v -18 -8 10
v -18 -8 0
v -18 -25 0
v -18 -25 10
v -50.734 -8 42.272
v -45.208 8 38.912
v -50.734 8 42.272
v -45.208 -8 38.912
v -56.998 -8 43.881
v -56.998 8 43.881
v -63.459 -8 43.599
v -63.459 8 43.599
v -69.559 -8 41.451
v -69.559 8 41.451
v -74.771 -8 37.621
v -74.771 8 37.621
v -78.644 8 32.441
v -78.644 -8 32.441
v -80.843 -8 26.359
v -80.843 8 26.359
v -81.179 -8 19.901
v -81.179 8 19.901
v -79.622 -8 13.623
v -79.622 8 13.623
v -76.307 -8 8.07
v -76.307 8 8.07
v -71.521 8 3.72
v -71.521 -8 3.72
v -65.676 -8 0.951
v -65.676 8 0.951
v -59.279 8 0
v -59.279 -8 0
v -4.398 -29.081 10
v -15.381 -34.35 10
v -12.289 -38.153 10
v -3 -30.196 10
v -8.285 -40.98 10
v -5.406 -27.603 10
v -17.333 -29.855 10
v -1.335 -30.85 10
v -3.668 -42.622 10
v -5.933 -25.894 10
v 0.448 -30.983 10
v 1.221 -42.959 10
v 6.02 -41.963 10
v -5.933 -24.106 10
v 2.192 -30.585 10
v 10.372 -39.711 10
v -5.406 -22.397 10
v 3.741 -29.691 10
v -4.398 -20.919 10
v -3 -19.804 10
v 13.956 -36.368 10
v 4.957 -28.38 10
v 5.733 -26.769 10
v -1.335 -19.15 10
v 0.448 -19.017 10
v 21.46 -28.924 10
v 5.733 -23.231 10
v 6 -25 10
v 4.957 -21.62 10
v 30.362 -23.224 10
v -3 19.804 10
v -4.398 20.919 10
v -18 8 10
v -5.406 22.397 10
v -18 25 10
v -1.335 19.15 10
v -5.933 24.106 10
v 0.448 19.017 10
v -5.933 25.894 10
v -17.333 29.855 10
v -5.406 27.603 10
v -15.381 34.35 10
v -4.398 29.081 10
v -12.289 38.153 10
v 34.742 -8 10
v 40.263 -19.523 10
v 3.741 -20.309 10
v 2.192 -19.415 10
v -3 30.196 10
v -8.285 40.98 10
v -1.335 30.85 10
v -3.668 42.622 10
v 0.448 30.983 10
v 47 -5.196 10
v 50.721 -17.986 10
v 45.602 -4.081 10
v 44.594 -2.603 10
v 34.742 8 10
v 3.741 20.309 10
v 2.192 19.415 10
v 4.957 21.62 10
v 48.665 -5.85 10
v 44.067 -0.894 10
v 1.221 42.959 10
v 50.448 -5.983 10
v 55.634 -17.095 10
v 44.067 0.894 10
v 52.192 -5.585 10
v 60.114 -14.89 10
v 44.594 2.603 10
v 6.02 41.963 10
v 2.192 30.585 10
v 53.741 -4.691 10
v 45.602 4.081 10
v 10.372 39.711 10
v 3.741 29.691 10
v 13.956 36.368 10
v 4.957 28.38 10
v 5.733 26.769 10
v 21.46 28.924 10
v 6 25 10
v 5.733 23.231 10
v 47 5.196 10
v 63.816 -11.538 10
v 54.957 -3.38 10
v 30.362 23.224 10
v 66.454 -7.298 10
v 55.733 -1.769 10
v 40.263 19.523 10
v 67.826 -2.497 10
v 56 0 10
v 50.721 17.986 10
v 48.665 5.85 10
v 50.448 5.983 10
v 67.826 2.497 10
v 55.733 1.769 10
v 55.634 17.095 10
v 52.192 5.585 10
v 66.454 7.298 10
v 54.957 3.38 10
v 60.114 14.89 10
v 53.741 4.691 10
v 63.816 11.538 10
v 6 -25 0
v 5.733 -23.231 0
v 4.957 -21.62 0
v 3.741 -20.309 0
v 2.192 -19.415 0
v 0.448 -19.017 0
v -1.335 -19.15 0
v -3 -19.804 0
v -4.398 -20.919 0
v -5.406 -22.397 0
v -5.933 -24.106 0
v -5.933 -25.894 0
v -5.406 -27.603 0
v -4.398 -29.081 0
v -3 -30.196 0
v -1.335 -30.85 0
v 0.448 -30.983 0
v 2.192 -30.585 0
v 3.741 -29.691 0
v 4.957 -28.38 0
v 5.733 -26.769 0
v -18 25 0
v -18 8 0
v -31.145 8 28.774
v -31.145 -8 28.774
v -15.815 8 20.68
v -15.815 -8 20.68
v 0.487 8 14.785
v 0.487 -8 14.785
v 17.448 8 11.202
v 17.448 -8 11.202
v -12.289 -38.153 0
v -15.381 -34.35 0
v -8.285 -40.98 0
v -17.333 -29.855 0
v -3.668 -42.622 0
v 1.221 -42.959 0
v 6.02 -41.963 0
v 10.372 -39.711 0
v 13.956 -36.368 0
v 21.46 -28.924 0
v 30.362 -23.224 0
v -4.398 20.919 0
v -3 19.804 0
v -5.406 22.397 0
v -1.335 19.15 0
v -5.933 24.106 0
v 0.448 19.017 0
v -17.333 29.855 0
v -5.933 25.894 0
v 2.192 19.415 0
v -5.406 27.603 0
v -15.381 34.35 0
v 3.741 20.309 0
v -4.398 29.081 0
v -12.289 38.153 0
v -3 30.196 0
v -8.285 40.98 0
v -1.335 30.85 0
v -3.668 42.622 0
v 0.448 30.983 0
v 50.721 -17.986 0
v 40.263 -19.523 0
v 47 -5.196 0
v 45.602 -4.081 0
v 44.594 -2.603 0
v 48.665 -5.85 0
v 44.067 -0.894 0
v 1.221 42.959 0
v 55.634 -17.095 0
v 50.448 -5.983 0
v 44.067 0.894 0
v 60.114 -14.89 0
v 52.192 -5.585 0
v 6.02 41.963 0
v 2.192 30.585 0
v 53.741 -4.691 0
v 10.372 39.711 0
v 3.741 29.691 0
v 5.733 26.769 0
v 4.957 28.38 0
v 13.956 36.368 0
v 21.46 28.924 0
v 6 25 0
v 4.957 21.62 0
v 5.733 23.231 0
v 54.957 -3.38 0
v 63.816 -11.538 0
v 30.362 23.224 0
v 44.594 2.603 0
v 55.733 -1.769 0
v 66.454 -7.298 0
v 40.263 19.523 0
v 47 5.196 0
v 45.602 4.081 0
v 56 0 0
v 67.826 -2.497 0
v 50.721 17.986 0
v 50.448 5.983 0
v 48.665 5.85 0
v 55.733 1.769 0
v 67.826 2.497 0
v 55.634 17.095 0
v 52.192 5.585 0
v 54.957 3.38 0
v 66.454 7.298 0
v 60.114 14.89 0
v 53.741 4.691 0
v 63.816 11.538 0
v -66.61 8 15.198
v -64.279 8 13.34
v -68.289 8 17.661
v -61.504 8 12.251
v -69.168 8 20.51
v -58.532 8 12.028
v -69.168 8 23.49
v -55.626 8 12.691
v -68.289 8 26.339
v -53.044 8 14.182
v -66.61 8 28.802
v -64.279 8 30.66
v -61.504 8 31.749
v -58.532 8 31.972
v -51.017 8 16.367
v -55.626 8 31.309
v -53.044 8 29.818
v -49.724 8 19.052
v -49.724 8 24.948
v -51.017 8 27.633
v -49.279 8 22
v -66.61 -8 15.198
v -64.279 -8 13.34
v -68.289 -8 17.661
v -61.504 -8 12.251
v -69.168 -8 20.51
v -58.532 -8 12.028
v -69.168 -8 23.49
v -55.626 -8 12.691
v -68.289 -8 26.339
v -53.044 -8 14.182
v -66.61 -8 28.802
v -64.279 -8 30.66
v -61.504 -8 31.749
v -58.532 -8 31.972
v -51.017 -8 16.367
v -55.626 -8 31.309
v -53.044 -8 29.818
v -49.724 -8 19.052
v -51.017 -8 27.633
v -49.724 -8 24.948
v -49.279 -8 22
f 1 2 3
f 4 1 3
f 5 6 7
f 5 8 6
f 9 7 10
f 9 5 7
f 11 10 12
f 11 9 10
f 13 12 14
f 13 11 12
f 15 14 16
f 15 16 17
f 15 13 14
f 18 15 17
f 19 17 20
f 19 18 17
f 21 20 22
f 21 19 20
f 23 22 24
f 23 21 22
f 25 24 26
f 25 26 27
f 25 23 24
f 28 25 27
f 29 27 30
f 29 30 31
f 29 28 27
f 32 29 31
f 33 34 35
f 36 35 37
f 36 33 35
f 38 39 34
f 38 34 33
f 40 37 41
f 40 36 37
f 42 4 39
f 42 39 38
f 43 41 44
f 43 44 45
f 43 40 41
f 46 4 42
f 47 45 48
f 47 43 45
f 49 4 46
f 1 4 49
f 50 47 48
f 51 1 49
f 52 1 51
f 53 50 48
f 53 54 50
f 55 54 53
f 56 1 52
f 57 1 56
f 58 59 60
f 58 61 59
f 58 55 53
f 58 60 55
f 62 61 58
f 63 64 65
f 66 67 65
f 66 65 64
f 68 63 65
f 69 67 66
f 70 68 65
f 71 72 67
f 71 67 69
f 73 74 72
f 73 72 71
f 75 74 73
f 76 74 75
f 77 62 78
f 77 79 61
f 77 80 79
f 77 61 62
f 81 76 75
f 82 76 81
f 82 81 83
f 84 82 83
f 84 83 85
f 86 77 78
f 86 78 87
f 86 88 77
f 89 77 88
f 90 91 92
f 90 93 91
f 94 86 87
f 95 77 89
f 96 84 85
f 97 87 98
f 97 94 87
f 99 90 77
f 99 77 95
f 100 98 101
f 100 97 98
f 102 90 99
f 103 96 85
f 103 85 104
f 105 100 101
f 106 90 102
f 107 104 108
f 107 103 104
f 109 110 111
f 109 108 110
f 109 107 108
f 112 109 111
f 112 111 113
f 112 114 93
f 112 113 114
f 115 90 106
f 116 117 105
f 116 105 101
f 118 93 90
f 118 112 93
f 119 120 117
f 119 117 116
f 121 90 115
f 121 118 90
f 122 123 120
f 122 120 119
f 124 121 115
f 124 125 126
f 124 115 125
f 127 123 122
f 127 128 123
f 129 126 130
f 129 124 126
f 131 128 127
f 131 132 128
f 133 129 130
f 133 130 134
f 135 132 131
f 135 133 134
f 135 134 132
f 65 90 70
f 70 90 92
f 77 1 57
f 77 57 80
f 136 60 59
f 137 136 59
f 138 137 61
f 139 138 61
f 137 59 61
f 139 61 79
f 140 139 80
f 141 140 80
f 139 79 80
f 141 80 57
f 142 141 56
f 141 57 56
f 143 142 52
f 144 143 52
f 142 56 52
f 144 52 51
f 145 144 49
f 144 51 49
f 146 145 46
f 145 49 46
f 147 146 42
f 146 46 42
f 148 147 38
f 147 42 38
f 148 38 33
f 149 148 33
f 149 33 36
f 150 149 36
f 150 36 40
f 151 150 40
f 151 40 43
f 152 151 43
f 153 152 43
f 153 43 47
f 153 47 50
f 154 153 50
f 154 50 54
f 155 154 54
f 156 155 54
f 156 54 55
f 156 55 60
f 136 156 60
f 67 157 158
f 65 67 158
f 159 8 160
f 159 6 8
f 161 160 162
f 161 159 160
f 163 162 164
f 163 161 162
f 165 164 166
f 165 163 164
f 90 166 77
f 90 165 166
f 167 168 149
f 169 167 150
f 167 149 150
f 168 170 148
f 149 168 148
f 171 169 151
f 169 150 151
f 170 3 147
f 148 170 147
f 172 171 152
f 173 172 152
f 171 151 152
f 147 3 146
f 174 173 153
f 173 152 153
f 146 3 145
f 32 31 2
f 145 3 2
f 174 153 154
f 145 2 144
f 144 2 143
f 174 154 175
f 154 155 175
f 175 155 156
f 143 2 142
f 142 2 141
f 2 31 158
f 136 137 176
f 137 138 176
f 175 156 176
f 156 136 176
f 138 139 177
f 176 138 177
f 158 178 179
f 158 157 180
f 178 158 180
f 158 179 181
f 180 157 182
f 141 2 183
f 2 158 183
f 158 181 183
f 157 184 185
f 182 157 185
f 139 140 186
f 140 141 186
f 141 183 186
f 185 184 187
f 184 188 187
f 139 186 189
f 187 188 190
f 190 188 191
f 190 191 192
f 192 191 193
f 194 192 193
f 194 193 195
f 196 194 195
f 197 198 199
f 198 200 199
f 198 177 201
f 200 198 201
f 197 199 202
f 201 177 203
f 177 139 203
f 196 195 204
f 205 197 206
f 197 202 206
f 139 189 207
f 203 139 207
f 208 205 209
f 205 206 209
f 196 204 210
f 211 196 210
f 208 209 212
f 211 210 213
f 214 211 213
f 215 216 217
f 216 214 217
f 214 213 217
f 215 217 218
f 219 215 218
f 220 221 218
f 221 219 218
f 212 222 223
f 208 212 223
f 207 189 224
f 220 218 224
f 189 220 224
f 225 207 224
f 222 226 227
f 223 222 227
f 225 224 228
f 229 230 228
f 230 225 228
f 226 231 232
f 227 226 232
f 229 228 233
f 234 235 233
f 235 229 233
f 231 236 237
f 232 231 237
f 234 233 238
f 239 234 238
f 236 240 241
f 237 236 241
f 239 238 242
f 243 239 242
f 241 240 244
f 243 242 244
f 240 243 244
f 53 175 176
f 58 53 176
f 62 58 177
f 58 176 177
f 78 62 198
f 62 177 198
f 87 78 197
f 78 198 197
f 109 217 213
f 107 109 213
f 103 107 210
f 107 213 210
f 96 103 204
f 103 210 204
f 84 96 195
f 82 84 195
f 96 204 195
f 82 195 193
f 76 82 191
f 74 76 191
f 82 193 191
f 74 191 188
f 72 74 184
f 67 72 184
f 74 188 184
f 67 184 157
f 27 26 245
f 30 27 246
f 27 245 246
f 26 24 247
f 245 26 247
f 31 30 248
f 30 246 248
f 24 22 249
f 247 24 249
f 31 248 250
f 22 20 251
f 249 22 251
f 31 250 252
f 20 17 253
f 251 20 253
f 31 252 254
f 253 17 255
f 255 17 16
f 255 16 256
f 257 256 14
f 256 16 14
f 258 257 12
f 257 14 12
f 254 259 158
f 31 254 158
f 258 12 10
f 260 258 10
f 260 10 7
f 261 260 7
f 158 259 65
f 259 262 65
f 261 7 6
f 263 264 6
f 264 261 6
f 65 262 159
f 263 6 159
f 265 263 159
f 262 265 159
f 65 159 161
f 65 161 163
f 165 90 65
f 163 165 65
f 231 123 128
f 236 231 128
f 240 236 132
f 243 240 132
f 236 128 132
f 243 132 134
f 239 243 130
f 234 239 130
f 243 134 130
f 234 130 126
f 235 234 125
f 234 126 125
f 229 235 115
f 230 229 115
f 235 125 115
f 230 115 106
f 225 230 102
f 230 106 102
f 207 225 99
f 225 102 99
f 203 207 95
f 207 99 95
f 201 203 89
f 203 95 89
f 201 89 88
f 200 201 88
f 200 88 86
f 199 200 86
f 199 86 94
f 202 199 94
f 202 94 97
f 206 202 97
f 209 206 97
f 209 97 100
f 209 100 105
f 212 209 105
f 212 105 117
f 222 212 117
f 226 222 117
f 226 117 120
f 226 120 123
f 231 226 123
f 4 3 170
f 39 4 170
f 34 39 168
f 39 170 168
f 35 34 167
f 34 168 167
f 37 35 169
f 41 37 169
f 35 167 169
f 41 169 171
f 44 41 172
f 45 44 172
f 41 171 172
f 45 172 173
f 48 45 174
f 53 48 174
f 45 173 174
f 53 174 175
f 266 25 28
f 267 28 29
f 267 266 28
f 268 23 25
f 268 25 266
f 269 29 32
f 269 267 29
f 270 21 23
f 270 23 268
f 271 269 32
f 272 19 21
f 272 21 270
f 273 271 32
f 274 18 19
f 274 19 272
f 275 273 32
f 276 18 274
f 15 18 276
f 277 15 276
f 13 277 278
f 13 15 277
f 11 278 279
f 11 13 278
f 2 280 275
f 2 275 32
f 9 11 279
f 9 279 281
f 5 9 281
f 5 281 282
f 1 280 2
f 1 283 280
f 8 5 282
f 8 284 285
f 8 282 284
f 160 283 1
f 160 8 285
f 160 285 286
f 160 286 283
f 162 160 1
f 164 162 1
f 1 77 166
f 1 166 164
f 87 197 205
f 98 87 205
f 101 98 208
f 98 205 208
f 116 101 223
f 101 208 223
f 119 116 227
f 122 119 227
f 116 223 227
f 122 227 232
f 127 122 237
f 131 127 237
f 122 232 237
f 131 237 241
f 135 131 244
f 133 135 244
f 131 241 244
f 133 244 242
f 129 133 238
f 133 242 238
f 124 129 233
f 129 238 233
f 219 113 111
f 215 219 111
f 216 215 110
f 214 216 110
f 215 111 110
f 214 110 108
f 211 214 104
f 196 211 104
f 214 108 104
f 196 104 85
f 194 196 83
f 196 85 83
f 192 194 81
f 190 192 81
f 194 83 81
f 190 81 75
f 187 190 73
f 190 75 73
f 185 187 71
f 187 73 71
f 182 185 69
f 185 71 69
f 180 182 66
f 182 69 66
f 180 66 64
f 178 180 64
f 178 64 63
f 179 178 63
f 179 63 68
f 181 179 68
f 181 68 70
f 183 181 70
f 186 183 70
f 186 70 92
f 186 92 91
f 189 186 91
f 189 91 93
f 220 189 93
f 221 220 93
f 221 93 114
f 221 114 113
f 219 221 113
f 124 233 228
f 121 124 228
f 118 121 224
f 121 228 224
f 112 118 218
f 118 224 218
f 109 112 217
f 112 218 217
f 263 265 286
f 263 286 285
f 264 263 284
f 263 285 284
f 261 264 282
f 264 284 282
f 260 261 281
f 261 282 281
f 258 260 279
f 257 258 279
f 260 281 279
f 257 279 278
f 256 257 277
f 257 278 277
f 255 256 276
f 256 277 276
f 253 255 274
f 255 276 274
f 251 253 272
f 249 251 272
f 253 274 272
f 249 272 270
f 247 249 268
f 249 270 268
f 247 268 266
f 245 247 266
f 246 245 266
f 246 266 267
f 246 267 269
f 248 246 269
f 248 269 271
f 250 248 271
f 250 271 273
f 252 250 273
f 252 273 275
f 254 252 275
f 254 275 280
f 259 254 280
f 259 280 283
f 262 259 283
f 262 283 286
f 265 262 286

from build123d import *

# Parameters (mm, degrees)
F1_DEPTH = 10
F3_DEPTH = 8
F4_R     = 125
F6_R     = 6
F7_DEPTH = 25
F8_R     = 10
F9_DEPTH = 25


with BuildPart() as f1:
    # F0 (on Top) → F1 (new body)
    with BuildSketch(Plane.XY):
        with BuildLine():
            ThreePointArc((13.956018, -36.367918), (30.362055, -23.224109), (50.720724, -17.985565))
            ThreePointArc((50.720724, -17.985565), (68, 0), (50.720724, 17.985565))
            ThreePointArc((50.720724, 17.985565), (30.362055, 23.224109), (13.956018, 36.367918))
            ThreePointArc((13.956018, 36.367918), (-6.032896, 41.958896), (-18, 25))
            Line((-18, 25), (-18, -25))
            ThreePointArc((-18, -25), (-6.032896, -41.958896), (13.956018, -36.367918))
        make_face()
    extrude(amount=F1_DEPTH)


with BuildPart() as f3:
    # F2 (on Front) → F3 (new body, symmetric)
    with BuildSketch(Plane.XZ):
        with BuildLine():
            Line((-59.279276, 0), (50.720724, 0))
            Line((50.720724, 0), (50.720724, 10))
            Line((50.720724, 10), (-40.840187, 10))
            ThreePointArc((-40.840187, 10), (-69.767365, 41.33908), (-59.279276, 0))
        make_face()
    extrude(amount=F3_DEPTH, both=True)

    # F4
    f4_edges = [f3.edges().sort_by_distance(p)[0] for p in [
        (-40.840187, 0, 10),
    ]]
    fillet(f4_edges, radius=F4_R)

    # F5: union F1
    add(f1.part)

    # F6 (on face) → F7 (cut)
    with BuildSketch(Plane.XY.offset(10)):
        with Locations((0, 25)):
            Circle(F6_R)
        with Locations((0, -25)):
            Circle(F6_R)
        with Locations((50, 0)):
            Circle(F6_R)
    extrude(amount=-F7_DEPTH, mode=Mode.SUBTRACT)

    # F8 (on face) → F9 (cut)
    with BuildSketch(Plane.XZ.offset(8)):
        with Locations((-59.279276, 22)):
            Circle(F8_R)
    extrude(amount=-F9_DEPTH, mode=Mode.SUBTRACT)


solid = f3.part
